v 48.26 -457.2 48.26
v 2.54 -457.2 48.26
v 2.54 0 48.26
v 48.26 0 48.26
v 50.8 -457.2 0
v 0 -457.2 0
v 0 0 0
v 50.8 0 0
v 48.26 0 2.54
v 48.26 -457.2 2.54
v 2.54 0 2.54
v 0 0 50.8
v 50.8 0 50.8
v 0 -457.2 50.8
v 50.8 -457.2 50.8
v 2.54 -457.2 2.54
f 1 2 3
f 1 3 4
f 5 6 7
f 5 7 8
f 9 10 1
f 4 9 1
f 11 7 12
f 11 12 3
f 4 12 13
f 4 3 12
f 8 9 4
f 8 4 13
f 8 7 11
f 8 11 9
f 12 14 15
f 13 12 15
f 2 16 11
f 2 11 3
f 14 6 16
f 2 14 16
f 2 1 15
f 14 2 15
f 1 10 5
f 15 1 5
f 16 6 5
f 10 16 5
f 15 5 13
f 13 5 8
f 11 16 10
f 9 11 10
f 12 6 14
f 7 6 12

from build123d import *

# Parameters (mm, degrees)
SKETCH1_W           = 50.8
SKETCH1_H           = 457.2
BOSS_EXTRUDE1_DEPTH = 50.8
SHELL1_T            = -2.54
SKETCH2_W           = 45.72
SKETCH2_H           = 45.72
CUT_EXTRUDE1_DEPTH  = 50.8


with BuildPart() as part:
    # Sketch1 → Boss-Extrude1 (new body)
    with BuildSketch(Plane.XY):
        with Locations((25.4, -228.6)):
            Rectangle(SKETCH1_W, SKETCH1_H)
    extrude(amount=BOSS_EXTRUDE1_DEPTH)

    # Shell1
    shell1_openings = [part.faces().sort_by_distance(p)[0] for p in [
        (25.4, 0, 25.4),
    ]]
    offset(amount=SHELL1_T, openings=shell1_openings, kind=Kind.INTERSECTION)

    # Sketch2 → Cut-Extrude1 (cut)
    with BuildSketch(Plane.XZ.offset(457.2)):
        with Locations((25.4, 25.4)):
            Rectangle(SKETCH2_W, SKETCH2_H)
    extrude(amount=-CUT_EXTRUDE1_DEPTH, mode=Mode.SUBTRACT)


solid = part.part
